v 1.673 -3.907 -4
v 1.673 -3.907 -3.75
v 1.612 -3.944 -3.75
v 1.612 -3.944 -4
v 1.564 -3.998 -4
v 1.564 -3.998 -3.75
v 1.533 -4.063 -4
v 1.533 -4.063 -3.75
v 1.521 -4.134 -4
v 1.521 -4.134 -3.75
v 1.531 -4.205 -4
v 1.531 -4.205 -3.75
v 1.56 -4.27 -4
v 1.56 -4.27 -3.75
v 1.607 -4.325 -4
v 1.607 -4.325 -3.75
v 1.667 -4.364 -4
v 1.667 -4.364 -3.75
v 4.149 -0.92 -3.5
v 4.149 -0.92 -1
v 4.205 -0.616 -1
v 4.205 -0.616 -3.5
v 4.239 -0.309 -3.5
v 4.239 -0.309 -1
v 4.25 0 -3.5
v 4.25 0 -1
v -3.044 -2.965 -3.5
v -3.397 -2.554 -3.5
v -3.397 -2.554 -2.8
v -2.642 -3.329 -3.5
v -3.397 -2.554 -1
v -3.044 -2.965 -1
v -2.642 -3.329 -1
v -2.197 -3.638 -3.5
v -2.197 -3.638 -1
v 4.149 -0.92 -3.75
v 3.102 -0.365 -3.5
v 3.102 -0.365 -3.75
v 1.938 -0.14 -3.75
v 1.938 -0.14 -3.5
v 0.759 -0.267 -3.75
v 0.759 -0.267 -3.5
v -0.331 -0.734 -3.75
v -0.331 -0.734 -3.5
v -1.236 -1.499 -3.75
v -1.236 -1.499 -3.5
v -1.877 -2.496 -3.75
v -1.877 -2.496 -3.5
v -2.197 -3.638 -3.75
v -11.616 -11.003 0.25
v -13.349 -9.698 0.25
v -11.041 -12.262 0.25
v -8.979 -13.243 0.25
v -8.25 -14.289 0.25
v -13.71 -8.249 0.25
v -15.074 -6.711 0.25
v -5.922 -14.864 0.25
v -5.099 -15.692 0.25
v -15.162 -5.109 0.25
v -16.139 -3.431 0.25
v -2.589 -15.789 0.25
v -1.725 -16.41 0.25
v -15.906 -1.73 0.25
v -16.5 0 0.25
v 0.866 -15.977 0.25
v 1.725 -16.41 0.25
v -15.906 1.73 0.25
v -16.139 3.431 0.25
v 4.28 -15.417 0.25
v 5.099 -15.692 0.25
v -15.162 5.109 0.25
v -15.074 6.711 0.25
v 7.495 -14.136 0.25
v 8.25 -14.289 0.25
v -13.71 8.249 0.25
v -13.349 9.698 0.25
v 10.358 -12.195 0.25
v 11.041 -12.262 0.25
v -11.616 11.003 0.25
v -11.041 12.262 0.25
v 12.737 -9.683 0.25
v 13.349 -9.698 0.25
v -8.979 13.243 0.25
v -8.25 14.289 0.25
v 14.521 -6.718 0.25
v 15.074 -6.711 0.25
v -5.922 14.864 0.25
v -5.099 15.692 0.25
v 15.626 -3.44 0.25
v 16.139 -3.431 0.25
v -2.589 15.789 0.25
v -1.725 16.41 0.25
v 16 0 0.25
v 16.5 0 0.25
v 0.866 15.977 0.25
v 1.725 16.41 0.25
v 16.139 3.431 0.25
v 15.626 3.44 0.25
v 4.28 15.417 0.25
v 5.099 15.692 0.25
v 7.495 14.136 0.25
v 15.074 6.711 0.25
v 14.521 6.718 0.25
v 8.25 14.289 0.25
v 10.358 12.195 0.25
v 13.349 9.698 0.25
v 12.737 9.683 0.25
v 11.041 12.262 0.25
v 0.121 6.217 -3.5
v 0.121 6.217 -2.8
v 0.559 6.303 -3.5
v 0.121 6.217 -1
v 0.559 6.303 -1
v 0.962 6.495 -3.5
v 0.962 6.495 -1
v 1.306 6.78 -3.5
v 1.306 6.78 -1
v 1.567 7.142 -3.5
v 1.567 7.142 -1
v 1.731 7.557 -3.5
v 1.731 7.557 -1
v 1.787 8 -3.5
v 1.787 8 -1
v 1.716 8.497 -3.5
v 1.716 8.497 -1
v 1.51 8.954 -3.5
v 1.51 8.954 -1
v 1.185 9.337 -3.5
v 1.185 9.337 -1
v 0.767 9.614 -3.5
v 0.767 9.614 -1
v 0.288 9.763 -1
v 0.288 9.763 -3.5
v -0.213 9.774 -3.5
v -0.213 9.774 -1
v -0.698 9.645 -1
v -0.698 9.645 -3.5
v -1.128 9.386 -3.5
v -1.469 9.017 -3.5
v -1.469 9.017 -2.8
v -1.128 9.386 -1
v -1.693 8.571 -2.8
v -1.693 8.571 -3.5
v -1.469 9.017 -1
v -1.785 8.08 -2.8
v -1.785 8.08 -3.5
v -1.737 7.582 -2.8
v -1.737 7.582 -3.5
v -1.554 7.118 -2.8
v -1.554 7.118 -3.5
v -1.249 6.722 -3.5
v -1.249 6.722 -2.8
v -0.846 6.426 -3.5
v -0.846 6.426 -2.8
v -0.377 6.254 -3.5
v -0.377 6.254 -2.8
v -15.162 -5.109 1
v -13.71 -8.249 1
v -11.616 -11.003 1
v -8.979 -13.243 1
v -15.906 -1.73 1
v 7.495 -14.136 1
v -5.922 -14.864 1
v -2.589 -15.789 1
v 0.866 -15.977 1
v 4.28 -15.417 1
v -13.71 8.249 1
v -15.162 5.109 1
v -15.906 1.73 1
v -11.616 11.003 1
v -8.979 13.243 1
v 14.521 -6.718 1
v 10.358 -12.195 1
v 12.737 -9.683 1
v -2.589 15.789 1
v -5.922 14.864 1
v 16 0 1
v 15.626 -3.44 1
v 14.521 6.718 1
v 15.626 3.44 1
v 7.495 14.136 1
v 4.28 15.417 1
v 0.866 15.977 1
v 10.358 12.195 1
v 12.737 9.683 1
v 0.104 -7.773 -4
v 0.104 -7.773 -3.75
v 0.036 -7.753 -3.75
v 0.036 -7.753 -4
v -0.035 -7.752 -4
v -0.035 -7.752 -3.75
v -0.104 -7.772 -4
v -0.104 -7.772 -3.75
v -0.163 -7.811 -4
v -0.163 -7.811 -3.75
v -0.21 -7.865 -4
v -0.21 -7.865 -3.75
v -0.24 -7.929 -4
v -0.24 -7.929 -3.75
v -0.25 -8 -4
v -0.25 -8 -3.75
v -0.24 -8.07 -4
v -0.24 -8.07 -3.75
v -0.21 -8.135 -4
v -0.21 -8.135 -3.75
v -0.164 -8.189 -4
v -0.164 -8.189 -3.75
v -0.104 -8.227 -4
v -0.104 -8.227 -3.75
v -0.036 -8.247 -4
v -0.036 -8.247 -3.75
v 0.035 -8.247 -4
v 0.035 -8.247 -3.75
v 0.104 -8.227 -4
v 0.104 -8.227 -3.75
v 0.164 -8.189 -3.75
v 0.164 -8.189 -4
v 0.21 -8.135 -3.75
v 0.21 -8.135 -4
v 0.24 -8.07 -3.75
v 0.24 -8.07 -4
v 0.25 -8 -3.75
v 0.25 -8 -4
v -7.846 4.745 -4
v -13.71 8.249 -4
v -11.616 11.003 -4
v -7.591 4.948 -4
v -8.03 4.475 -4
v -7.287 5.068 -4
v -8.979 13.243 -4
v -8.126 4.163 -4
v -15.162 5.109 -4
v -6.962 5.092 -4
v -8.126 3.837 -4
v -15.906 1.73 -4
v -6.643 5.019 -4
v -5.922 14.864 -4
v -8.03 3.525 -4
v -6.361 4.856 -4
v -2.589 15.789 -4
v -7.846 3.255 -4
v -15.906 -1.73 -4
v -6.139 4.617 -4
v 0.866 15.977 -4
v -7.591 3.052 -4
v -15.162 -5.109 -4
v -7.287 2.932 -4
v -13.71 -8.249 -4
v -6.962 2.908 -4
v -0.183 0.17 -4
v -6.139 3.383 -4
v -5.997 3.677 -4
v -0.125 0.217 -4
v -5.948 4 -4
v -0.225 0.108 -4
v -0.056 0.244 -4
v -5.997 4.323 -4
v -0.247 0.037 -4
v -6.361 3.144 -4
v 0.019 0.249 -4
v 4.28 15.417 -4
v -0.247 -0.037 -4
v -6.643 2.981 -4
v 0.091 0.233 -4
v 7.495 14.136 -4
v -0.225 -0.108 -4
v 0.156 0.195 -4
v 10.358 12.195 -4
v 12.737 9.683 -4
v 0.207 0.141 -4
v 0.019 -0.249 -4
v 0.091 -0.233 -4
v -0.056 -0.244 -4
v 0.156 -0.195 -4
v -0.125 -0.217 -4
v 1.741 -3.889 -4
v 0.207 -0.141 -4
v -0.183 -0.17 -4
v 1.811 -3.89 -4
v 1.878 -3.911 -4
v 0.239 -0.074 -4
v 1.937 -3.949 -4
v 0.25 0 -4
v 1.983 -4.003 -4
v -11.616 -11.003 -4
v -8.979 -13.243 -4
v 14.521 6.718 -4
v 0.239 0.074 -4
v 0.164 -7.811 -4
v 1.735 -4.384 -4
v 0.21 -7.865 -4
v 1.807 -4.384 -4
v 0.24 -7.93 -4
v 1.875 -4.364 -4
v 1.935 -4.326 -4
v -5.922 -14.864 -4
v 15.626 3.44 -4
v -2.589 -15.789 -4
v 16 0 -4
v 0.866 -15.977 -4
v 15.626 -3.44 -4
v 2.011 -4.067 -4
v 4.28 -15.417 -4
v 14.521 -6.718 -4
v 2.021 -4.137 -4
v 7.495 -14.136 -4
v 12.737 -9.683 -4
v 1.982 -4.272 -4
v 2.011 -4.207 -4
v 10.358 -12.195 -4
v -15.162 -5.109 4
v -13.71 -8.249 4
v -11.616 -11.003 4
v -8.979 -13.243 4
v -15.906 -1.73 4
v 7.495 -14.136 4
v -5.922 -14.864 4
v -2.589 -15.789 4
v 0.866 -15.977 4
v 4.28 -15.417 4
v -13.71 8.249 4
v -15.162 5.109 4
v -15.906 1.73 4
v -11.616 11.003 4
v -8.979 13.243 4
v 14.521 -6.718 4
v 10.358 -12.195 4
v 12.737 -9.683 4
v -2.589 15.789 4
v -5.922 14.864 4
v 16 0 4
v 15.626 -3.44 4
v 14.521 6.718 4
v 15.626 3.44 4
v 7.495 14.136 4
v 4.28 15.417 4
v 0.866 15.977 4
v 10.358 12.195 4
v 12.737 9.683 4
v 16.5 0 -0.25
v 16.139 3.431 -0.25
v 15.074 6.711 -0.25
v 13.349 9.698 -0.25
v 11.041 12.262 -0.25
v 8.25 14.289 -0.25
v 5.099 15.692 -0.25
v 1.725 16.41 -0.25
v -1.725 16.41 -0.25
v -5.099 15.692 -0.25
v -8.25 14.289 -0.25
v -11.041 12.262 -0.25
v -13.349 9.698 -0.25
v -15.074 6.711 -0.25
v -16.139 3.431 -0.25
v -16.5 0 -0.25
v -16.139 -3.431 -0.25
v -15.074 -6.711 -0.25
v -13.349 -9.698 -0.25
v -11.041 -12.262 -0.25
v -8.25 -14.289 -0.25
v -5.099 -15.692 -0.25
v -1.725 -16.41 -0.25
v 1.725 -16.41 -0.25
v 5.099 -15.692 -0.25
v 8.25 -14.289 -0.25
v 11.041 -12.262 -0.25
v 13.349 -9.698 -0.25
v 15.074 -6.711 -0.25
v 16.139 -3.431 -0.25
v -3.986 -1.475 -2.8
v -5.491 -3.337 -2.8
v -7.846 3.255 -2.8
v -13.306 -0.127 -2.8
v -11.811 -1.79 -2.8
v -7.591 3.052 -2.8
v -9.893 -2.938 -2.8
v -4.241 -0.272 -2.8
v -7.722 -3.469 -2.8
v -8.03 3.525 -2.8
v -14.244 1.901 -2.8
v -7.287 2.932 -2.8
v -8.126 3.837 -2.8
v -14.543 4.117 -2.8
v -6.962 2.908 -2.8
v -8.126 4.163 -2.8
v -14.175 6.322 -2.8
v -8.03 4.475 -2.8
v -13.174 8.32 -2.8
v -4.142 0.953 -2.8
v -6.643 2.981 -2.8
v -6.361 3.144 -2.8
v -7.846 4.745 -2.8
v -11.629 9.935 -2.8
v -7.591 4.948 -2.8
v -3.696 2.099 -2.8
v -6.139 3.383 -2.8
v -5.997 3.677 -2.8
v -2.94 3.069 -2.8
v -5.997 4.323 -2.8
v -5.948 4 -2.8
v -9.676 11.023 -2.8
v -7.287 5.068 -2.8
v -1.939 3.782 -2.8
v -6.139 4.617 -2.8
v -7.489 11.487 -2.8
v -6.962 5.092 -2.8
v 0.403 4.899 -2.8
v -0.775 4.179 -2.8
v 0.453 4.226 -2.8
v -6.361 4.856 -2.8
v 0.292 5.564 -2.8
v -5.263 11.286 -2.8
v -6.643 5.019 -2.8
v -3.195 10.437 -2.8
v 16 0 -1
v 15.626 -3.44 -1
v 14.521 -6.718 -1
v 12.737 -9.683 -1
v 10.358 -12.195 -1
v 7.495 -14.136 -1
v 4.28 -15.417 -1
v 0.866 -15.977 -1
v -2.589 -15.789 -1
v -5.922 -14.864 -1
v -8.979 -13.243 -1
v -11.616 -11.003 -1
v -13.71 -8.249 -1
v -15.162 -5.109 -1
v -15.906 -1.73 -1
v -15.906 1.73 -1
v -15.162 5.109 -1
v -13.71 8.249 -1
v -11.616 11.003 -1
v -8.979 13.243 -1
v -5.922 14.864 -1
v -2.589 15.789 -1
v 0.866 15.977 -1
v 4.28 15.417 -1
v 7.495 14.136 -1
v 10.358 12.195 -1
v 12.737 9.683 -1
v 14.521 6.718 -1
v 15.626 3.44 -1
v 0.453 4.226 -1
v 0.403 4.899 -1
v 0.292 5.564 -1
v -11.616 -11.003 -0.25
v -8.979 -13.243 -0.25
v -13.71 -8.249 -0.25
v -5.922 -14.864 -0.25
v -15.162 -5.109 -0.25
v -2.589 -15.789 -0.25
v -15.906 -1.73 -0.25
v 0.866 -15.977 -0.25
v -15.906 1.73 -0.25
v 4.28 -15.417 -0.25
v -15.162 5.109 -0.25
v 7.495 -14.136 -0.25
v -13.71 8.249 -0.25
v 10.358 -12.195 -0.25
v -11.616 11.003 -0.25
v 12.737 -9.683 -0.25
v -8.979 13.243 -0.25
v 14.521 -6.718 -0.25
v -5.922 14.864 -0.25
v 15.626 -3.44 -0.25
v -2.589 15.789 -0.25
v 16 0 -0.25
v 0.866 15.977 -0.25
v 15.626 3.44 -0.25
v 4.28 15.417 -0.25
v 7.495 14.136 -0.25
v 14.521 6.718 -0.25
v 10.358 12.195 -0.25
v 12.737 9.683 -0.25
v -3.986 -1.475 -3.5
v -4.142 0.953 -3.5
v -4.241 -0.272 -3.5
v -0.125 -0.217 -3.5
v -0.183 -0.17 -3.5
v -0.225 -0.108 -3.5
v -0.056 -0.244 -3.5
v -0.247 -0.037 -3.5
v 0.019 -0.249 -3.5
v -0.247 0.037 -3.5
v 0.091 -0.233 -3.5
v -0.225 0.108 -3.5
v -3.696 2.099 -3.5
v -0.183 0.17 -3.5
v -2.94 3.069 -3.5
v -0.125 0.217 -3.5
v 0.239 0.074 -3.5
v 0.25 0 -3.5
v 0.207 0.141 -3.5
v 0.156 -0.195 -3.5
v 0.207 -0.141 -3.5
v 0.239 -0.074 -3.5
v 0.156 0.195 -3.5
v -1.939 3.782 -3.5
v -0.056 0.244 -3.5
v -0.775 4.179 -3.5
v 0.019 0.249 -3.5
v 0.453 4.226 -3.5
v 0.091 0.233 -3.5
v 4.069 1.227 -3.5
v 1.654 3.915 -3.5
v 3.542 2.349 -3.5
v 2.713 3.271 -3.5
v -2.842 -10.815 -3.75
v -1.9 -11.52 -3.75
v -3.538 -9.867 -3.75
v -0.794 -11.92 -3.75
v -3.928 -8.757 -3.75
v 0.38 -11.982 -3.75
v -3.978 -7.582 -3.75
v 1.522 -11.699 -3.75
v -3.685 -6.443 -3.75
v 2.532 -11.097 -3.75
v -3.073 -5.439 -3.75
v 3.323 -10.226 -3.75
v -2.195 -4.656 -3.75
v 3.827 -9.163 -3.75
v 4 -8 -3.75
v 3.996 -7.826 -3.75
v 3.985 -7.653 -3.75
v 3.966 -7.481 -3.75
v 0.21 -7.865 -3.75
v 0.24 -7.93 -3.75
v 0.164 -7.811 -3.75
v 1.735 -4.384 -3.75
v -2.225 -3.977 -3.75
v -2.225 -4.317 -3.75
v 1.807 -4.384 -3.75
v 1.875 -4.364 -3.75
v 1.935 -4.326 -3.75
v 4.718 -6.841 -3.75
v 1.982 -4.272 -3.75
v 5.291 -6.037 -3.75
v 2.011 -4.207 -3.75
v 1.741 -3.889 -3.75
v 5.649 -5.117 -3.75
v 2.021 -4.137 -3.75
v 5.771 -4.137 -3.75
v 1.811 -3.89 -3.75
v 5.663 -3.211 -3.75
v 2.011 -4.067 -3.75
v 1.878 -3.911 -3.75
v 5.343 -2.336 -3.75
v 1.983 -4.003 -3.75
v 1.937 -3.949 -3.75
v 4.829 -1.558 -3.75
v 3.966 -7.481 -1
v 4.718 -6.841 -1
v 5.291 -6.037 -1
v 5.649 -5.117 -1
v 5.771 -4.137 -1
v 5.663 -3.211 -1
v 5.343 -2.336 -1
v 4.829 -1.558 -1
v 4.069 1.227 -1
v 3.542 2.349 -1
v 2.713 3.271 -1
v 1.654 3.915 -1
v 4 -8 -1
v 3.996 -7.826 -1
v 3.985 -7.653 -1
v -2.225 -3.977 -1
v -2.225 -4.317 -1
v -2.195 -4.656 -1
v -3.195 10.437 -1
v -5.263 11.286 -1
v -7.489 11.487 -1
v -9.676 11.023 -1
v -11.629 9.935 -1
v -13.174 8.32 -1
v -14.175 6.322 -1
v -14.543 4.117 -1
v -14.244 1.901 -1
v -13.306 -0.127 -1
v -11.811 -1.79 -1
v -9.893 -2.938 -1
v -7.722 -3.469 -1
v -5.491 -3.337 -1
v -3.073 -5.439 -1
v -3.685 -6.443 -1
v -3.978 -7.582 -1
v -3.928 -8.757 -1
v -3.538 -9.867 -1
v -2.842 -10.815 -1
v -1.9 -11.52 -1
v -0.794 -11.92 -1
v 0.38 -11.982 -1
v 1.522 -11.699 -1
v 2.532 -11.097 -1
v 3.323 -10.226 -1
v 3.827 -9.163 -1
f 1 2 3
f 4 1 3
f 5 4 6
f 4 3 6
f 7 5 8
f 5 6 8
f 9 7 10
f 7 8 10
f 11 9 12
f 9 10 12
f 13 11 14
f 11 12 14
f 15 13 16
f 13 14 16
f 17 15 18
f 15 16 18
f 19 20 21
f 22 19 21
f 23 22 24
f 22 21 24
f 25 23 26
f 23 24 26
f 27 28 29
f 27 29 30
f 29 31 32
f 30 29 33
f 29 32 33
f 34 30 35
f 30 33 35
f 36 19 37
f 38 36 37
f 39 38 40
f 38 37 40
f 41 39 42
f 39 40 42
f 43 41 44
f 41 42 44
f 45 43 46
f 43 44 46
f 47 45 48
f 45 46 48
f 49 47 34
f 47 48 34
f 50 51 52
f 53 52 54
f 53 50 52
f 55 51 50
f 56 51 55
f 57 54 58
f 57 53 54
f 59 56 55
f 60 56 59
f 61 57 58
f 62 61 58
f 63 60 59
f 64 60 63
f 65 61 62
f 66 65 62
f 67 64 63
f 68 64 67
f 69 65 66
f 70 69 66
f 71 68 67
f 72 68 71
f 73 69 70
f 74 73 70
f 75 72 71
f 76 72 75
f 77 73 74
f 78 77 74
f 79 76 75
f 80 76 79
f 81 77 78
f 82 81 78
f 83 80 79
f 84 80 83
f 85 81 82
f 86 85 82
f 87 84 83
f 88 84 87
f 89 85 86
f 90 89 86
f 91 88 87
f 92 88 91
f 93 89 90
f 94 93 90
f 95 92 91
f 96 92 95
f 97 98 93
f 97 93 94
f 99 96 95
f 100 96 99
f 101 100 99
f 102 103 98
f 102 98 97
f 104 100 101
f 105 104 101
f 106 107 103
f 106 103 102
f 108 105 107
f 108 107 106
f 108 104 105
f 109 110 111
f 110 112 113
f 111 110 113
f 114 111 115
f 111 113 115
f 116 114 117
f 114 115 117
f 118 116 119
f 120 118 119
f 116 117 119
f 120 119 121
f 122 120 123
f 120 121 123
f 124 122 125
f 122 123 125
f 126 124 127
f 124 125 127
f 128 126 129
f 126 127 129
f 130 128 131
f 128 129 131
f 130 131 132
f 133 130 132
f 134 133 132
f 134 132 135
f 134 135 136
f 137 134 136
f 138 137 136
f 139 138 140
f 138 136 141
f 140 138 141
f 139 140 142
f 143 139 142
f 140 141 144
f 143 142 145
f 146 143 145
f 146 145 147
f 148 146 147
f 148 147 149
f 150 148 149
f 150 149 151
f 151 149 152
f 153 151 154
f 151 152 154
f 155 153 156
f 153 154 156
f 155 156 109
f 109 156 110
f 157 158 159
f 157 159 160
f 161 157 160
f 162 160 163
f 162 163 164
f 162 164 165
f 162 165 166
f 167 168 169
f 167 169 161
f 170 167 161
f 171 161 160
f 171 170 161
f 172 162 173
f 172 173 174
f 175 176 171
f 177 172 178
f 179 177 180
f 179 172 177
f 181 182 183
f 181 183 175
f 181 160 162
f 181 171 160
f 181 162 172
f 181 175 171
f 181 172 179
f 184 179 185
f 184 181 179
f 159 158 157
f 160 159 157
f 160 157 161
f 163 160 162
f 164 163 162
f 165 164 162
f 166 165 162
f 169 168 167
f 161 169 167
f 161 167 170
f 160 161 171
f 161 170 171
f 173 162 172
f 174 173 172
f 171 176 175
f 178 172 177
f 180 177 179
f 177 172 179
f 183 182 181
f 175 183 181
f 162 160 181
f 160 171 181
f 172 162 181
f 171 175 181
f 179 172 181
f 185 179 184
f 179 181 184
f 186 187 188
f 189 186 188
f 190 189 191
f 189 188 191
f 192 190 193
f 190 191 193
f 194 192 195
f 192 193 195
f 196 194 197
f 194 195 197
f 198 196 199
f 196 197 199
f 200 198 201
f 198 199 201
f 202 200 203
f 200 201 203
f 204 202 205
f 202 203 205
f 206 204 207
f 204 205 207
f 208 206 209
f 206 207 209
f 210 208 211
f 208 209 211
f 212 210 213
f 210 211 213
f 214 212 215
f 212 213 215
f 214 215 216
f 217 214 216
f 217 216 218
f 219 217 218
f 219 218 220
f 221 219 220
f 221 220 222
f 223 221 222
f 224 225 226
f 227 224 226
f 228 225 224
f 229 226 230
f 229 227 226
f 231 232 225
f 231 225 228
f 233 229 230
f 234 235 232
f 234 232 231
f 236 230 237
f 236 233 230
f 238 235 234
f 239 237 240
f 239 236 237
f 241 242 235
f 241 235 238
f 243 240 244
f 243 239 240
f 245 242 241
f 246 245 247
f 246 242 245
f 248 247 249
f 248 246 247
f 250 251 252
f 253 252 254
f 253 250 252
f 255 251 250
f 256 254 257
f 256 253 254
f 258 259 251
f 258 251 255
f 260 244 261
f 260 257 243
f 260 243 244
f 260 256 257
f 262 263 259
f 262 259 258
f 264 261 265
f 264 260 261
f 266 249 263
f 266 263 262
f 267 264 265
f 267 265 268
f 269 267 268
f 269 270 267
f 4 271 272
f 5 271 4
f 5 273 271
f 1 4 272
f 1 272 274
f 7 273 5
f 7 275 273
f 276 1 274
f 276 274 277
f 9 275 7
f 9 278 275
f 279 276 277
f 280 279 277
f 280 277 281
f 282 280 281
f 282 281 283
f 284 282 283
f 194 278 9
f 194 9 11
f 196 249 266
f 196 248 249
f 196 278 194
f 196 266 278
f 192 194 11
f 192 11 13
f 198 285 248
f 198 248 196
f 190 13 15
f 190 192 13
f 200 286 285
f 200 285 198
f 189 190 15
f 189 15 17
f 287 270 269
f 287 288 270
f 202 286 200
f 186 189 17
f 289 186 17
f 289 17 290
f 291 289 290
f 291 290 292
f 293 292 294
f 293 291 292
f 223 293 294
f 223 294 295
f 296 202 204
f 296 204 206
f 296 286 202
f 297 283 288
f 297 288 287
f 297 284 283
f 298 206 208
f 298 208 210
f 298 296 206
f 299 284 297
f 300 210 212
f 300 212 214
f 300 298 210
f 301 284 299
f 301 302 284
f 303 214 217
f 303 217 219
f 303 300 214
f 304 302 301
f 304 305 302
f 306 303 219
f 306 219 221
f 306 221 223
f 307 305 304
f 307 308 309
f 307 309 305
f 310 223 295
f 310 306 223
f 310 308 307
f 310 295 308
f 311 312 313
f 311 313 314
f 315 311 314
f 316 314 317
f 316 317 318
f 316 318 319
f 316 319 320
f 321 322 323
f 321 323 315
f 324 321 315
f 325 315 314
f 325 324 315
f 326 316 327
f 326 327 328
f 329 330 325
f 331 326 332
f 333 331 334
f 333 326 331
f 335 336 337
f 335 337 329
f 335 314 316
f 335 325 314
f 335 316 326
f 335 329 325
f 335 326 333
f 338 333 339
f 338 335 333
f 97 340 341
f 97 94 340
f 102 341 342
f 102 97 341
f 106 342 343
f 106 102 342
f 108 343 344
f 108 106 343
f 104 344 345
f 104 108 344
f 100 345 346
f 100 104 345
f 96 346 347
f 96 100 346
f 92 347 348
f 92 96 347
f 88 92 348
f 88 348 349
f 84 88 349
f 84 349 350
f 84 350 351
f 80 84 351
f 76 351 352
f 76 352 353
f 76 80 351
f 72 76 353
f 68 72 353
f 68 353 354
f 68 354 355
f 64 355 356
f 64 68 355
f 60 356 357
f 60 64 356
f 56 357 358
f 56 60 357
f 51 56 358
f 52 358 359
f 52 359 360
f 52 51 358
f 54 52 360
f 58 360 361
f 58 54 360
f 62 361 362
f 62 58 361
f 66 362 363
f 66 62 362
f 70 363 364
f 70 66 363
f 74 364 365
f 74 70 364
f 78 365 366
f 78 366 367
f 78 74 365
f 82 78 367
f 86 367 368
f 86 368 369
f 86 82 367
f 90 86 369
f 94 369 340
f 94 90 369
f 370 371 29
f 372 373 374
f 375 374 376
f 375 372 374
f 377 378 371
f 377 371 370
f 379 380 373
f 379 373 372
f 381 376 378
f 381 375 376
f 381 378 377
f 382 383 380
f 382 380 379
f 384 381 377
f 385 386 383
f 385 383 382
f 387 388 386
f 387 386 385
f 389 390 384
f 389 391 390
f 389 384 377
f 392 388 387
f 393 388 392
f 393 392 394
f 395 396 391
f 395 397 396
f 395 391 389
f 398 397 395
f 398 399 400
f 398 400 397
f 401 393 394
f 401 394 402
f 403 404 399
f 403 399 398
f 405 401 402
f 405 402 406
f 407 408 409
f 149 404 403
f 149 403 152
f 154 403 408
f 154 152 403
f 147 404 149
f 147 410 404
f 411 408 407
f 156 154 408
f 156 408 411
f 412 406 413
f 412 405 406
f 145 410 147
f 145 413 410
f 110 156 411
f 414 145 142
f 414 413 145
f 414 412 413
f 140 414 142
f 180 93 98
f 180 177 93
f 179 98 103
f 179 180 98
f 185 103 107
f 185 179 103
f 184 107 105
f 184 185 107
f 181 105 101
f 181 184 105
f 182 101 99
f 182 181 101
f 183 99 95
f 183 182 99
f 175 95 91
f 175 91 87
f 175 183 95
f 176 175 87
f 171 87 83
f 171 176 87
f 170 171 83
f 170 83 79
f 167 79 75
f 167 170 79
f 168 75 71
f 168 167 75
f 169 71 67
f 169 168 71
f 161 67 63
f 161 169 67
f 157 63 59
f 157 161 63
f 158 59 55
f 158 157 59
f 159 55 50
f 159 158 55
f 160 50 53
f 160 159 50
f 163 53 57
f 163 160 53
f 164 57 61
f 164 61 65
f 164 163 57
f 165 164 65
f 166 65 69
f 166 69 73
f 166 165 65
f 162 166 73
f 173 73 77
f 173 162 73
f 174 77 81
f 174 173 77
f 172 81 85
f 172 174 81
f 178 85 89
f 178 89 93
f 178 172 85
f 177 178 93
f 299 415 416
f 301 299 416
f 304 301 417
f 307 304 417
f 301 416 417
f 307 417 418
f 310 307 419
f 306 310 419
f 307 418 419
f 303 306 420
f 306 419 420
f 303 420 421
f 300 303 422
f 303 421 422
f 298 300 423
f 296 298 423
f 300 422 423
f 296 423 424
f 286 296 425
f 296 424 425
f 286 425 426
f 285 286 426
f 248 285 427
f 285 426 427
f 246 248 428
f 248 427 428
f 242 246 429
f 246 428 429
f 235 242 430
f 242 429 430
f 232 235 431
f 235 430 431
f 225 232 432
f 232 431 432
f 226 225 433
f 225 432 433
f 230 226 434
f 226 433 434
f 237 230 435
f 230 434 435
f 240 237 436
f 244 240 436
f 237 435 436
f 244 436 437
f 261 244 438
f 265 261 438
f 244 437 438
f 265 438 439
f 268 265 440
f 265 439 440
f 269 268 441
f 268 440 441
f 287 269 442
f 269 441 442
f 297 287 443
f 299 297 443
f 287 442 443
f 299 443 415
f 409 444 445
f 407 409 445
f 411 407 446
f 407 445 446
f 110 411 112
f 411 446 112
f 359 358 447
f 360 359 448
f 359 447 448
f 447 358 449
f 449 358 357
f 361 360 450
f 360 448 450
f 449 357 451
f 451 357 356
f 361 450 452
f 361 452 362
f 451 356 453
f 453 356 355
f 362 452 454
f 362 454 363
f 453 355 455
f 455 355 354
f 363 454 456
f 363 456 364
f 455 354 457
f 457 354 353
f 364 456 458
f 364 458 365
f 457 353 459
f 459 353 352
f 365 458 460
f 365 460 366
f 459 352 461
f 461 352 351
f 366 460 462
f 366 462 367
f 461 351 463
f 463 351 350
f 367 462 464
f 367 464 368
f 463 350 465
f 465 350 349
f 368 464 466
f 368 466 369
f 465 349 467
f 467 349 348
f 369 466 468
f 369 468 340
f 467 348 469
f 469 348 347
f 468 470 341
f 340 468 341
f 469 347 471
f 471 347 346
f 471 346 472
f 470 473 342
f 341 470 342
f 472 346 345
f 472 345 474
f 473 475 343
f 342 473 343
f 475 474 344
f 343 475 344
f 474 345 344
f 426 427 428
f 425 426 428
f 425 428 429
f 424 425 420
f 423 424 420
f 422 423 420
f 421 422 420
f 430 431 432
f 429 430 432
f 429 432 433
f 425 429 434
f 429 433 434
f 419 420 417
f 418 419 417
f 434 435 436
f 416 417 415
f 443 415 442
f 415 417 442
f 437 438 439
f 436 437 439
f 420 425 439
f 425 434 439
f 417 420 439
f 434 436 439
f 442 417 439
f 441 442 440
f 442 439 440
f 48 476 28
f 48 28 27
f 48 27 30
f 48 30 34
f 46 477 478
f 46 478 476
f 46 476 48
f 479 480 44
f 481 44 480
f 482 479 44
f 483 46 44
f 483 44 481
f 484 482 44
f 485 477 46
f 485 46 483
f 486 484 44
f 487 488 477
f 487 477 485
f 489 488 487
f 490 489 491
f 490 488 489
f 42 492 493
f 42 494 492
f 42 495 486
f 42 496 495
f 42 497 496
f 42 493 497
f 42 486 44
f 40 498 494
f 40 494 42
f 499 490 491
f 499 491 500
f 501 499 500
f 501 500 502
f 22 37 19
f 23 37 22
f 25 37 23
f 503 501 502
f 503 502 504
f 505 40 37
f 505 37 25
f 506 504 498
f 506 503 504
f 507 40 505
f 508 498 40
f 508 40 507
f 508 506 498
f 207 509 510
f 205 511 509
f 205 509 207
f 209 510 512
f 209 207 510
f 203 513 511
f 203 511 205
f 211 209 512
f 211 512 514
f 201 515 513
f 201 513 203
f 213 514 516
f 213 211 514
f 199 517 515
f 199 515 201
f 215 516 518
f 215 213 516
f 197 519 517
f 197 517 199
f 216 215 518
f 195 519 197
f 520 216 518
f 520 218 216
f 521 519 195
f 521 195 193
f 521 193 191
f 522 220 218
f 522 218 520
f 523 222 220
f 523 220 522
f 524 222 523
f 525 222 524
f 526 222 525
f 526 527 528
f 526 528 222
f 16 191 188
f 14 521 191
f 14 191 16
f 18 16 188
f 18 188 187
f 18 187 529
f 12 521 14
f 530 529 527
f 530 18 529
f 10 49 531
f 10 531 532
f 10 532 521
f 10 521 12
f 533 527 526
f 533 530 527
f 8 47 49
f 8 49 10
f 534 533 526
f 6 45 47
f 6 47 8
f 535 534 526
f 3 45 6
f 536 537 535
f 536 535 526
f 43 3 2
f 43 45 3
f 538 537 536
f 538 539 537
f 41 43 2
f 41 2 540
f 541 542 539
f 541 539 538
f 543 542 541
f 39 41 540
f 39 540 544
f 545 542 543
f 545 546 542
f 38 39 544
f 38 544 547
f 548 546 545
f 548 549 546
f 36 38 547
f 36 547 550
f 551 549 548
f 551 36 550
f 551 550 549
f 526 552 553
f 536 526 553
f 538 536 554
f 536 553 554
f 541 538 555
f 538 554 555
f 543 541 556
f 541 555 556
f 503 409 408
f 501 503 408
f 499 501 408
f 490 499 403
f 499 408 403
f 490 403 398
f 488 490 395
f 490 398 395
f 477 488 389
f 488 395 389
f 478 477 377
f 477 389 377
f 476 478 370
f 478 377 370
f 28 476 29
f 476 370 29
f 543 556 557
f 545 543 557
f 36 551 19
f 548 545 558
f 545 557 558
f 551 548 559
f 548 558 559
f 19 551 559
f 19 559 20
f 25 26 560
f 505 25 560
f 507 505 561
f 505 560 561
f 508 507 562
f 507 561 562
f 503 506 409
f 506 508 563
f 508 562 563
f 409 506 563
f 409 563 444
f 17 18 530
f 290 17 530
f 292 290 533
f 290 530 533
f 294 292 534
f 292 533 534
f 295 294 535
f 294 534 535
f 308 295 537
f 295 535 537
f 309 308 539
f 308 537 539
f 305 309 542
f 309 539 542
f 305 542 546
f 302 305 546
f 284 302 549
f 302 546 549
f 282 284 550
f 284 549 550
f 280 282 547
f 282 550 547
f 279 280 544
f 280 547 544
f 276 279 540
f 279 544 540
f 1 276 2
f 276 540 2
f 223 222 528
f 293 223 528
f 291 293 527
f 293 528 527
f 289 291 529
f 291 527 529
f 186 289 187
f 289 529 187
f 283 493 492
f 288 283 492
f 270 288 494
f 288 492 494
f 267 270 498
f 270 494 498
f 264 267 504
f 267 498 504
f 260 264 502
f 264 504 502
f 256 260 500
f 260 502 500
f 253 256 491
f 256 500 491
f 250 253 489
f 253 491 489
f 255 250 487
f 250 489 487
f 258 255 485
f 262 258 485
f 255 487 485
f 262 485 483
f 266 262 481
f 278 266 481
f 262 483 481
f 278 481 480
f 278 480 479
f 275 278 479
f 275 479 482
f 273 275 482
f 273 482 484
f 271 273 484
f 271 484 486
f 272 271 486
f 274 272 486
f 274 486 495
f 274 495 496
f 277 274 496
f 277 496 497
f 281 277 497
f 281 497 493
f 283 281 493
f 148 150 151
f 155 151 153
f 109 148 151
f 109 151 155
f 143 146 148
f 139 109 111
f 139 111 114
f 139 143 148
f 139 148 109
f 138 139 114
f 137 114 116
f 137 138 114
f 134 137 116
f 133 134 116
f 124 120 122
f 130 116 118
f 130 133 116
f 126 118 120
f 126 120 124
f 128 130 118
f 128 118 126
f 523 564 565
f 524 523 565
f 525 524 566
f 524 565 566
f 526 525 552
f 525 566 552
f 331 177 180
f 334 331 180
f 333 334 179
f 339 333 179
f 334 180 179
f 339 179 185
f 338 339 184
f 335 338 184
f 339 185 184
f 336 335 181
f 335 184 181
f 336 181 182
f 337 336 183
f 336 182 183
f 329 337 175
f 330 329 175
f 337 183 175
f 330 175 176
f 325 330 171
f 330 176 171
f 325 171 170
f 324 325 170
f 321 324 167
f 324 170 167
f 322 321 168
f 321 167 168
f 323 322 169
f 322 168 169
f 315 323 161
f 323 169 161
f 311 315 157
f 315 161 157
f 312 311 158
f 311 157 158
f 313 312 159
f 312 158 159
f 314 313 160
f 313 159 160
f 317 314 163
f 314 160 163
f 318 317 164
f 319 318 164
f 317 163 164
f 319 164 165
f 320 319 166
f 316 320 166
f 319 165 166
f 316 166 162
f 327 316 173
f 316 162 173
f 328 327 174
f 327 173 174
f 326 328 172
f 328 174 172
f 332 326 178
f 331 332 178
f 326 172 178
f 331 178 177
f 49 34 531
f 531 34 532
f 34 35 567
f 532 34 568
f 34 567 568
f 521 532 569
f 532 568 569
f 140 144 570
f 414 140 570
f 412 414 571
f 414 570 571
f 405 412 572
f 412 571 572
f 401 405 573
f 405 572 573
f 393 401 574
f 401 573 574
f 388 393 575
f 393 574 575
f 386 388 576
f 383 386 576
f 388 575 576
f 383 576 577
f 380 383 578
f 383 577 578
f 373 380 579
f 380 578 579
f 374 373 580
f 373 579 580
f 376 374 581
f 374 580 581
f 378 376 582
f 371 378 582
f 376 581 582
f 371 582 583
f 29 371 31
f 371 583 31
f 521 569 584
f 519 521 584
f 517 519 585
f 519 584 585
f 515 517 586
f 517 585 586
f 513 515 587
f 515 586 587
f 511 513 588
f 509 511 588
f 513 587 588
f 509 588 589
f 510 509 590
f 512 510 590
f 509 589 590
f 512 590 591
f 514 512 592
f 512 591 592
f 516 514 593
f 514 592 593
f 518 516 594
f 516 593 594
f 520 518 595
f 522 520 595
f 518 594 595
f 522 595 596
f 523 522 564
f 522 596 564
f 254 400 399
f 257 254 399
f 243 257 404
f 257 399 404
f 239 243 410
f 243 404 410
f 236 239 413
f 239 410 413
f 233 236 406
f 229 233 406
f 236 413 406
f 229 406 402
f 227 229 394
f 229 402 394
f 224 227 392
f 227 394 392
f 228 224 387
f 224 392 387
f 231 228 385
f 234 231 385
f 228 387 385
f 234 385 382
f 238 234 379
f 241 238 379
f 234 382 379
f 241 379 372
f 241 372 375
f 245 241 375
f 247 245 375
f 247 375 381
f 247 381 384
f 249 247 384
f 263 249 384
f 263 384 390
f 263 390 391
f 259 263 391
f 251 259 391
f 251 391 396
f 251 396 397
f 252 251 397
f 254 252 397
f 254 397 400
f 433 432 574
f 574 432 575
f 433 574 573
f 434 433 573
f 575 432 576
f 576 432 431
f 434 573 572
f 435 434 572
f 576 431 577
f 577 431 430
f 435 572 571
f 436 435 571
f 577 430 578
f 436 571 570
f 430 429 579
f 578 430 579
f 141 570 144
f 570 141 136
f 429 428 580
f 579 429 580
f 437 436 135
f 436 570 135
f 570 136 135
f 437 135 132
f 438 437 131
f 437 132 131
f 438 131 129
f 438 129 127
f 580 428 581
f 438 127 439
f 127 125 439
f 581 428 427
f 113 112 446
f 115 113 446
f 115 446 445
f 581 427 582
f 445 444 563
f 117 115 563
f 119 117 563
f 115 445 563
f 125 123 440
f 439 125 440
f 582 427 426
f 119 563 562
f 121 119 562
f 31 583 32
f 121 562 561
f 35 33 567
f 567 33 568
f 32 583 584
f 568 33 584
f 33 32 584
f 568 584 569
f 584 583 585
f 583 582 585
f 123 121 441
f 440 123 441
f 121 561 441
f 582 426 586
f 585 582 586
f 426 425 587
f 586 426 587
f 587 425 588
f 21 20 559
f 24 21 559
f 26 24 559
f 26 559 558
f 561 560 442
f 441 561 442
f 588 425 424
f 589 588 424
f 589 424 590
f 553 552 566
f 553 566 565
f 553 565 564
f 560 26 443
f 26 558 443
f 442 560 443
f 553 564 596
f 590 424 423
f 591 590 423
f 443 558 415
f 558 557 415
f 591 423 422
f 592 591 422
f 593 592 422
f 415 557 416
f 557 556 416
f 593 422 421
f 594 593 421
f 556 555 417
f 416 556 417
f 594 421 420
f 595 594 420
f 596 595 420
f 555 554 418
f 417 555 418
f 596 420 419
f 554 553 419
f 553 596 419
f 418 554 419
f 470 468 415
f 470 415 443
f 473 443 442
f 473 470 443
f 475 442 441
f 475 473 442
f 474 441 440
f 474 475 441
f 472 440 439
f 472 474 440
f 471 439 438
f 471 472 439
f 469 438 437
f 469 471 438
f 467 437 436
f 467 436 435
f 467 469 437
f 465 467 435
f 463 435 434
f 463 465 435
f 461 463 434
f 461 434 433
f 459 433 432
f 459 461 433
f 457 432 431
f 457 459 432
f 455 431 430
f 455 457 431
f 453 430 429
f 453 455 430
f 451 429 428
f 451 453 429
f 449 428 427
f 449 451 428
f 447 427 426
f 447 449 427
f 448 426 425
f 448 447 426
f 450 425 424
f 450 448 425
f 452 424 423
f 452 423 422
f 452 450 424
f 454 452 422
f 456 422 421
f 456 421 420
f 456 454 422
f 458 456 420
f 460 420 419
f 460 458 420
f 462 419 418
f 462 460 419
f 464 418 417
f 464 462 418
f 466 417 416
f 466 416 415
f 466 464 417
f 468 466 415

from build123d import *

# Parameters (mm, degrees)
F0_R      = 16
F1_DEPTH  = 1
F0_R_2    = 16.5
F2_DEPTH  = 0.25
F3_R      = 16
F4_DEPTH  = 3
F5_R      = 16
F6_DEPTH  = 3
F8_DEPTH  = 3.001
F9_DEPTH  = 2.75
F7_R      = 0.25
F10_DEPTH = 3.001
F11_DEPTH = 2.5
F7_R_2    = 1.095
F12_DEPTH = 3.001
F13_DEPTH = 1.8
F14_DEPTH = 2.75
F15_DEPTH = 3.001
F16_DEPTH = 2.5


with BuildPart() as f1:
    # F0 (on Top) → F1 (new body, symmetric)
    with BuildSketch(Plane.XY):
        Circle(F0_R)
    extrude(amount=F1_DEPTH, both=True)

    # F0 (on Top) → F2 (join, symmetric)
    with BuildSketch(Plane.XY):
        Circle(F0_R_2)
        Circle(F0_R, mode=Mode.SUBTRACT)
    extrude(amount=F2_DEPTH, both=True)


with BuildPart() as f4:
    # F3 (on face) → F4 (new body)
    with BuildSketch(Plane.XY.offset(1)):
        Circle(F3_R)
    extrude(amount=F4_DEPTH)


with BuildPart() as f6:
    # F5 (on face) → F6 (new body)
    with BuildSketch(Plane(origin=(0, 0, -1), x_dir=(1, 0, 0), z_dir=(0, 0, -1))):
        Circle(F5_R)
    extrude(amount=F6_DEPTH)

    # F7 (on face) → F8 (cut, through all)
    with BuildSketch(Plane.XY.offset(-1)):
        with BuildLine():
            ThreePointArc((1.6671203117, -4.3639705905), (1.906317634, -4.3471335232), (2.0213153258, -4.13671875))
            ThreePointArc((2.0213153258, -4.13671875), (1.9089714055, -3.9280304568), (1.6729088959, -3.9069010515))
            ThreePointArc((1.6729088959, -3.9069010515), (1.5213353723, -4.133552864), (1.6671203117, -4.3639705905))
        make_face()
    extrude(amount=-F8_DEPTH, mode=Mode.SUBTRACT)

    # F7 (on face) → F9 (cut)
    with BuildSketch(Plane.XY.offset(-1)):
        with BuildLine():
            ThreePointArc((1.6671203117, -4.3639705905), (1.5213353723, -4.133552864), (1.6729088959, -3.9069010515))
            ThreePointArc((1.6729088959, -3.9069010515), (1.3446888601, -4.0316636603), (1.0072900172, -4.12890625))
            ThreePointArc((1.0072900172, -4.12890625), (1.3423604072, -4.2319675509), (1.6671203117, -4.3639705905))
        make_face()
        with BuildLine():
            ThreePointArc((1.6729088959, -3.9069010515), (1.9089714055, -3.9280304568), (2.0213153258, -4.13671875))
            ThreePointArc((2.0213153258, -4.13671875), (1.906317634, -4.3471335232), (1.6671203117, -4.3639705905))
            ThreePointArc((1.6671203117, -4.3639705905), (3.2190154397, -5.6255654149), (3.96615671, -7.4807688839))
            ThreePointArc((3.96615671, -7.4807688839), (5.2912134448, -6.0368022302), (5.7713153258, -4.13671875))
            ThreePointArc((5.7713153258, -4.13671875), (5.3428308655, -2.3355311557), (4.1491769509, -0.9202340085))
            ThreePointArc((4.1491769509, -0.9202340085), (3.2717298037, -2.7126157287), (1.6729088959, -3.9069010515))
        make_face()
        with BuildLine():
            ThreePointArc((1.0072900172, -4.12890625), (1.3446888601, -4.0316636603), (1.6729088959, -3.9069010515))
            ThreePointArc((1.6729088959, -3.9069010515), (3.2717298037, -2.7126157287), (4.1491769509, -0.9202340085))
            ThreePointArc((4.1491769509, -0.9202340085), (0.196812814, -0.4596354167), (-2.1974498789, -3.6378172067))
            ThreePointArc((-2.1974498789, -3.6378172067), (-1.6210742002, -3.9286916954), (-1.0072900172, -4.12890625))
            ThreePointArc((-1.0072900172, -4.12890625), (0, -4), (1.0072900172, -4.12890625))
        make_face()
        with BuildLine():
            ThreePointArc((3.96615671, -7.4807688839), (3.2190154397, -5.6255654149), (1.6671203117, -4.3639705905))
            ThreePointArc((1.6671203117, -4.3639705905), (1.3423604072, -4.2319675509), (1.0072900172, -4.12890625))
            ThreePointArc((1.0072900172, -4.12890625), (0, -4.25), (-1.0072900172, -4.12890625))
            ThreePointArc((-1.0072900172, -4.12890625), (-1.6226075068, -4.3438893782), (-2.1948413842, -4.6559498661))
            ThreePointArc((-2.1948413842, -4.6559498661), (-1.4477001127, -6.5111533367), (0.1041950177, -7.7727481611))
            ThreePointArc((0.1041950177, -7.7727481611), (2.0728702265, -8.1253356333), (3.96615671, -7.4807688839))
        make_face()
        with BuildLine():
            ThreePointArc((-2.1948413842, -4.6559498661), (-1.6226075068, -4.3438893782), (-1.0072900172, -4.12890625))
            ThreePointArc((-1.0072900172, -4.12890625), (-1.6210742002, -3.9286916954), (-2.1974498789, -3.6378172067))
            ThreePointArc((-2.1974498789, -3.6378172067), (-2.2286715462, -4.146966869), (-2.1948413842, -4.6559498661))
        make_face()
        with BuildLine():
            ThreePointArc((-1.0072900172, -4.12890625), (0, -4.25), (1.0072900172, -4.12890625))
            ThreePointArc((1.0072900172, -4.12890625), (0, -4), (-1.0072900172, -4.12890625))
        make_face()
    extrude(amount=-F9_DEPTH, mode=Mode.SUBTRACT)

    # F7 (on face) → F10 (cut, through all)
    with BuildSketch(Plane.XY.offset(-1)):
        Circle(F7_R)
    extrude(amount=-F10_DEPTH, mode=Mode.SUBTRACT)

    # F7 (on face) → F11 (cut)
    with BuildSketch(Plane.XY.offset(-1)):
        with BuildLine():
            ThreePointArc((-2.1974498789, -3.6378172067), (0.196812814, -0.4596354167), (4.1491769509, -0.9202340085))
            ThreePointArc((4.1491769509, -0.9202340085), (4.2247190463, -0.46287037), (4.25, 0))
            ThreePointArc((4.25, 0), (3.1613643157, 2.8404710284), (0.4531643937, 4.225771176))
            ThreePointArc((0.4531643937, 4.225771176), (0.4557135544, 4.1128983799), (0.4565633388, 4))
            ThreePointArc((0.4565633388, 4), (-0.578227274, 0.1985440185), (-3.3970546824, -2.5539223725))
            ThreePointArc((-3.3970546824, -2.5539223725), (-2.8492678576, -3.1534382308), (-2.1974498789, -3.6378172067))
        make_face()
        Circle(F7_R, mode=Mode.SUBTRACT)
        with BuildLine():
            ThreePointArc((0.4531643937, 4.225771176), (-3.6956303469, 2.0987654321), (-3.3970546824, -2.5539223725))
            ThreePointArc((-3.3970546824, -2.5539223725), (-0.578227274, 0.1985440185), (0.4565633388, 4))
            ThreePointArc((0.4565633388, 4), (0.4557135544, 4.1128983799), (0.4531643937, 4.225771176))
        make_face()
    extrude(amount=-F11_DEPTH, mode=Mode.SUBTRACT)

    # F7 (on face) → F12 (cut, through all)
    with BuildSketch(Plane.XY.offset(-1)):
        with Locations((-7.0434366612, 4)):
            Circle(F7_R_2)
    extrude(amount=-F12_DEPTH, mode=Mode.SUBTRACT)

    # F7 (on face) → F13 (cut)
    with BuildSketch(Plane.XY.offset(-1)):
        with BuildLine():
            ThreePointArc((-1.4687815286, 9.0172921136), (-14.4414183132, 5.2328290543), (-3.3970546824, -2.5539223725))
            ThreePointArc((-3.3970546824, -2.5539223725), (-3.6956303469, 2.0987654321), (0.4531643937, 4.225771176))
            ThreePointArc((0.4531643937, 4.225771176), (0.3545449908, 5.2328290543), (0.1212637306, 6.2174463456))
            ThreePointArc((0.1212637306, 6.2174463456), (-1.5536200099, 7.1176920673), (-1.4687815286, 9.0172921136))
        make_face()
        with Locations((-7.0434366612, 4)):
            Circle(F7_R_2, mode=Mode.SUBTRACT)
        with BuildLine():
            ThreePointArc((1.7866735637, 8), (0.5329020994, 9.7053497517), (-1.4687815286, 9.0172921136))
            ThreePointArc((-1.4687815286, 9.0172921136), (-0.521736049, 7.7037037037), (0.1212637306, 6.2174463456))
            ThreePointArc((0.1212637306, 6.2174463456), (1.3055384186, 6.7802574613), (1.7866735637, 8))
        make_face()
    extrude(amount=-F13_DEPTH, mode=Mode.SUBTRACT)

    # F7 (on face) → F14 (cut, through all)
    with BuildSketch(Plane.XY.offset(-1)):
        with BuildLine():
            ThreePointArc((4, -8), (3.9915302103, -7.7398335532), (3.96615671, -7.4807688839))
            ThreePointArc((3.96615671, -7.4807688839), (2.0728702265, -8.1253356333), (0.1041950177, -7.7727481611))
            ThreePointArc((0.1041950177, -7.7727481611), (-1.4477001127, -6.5111533367), (-2.1948413842, -4.6559498661))
            ThreePointArc((-2.1948413842, -4.6559498661), (-1.9000834802, -11.519898119), (4, -8))
        make_face()
        with BuildLine():
            ThreePointArc((0.25, -8), (-0.2104147742, -8.1350023066), (0.1041950177, -7.7727481611))
            ThreePointArc((0.1041950177, -7.7727481611), (0.2104147742, -7.8649976934), (0.25, -8))
        make_face(mode=Mode.SUBTRACT)
        with BuildLine():
            ThreePointArc((3.96615671, -7.4807688839), (3.2190154397, -5.6255654149), (1.6671203117, -4.3639705905))
            ThreePointArc((1.6671203117, -4.3639705905), (1.3423604072, -4.2319675509), (1.0072900172, -4.12890625))
            ThreePointArc((1.0072900172, -4.12890625), (0, -4.25), (-1.0072900172, -4.12890625))
            ThreePointArc((-1.0072900172, -4.12890625), (-1.6226075068, -4.3438893782), (-2.1948413842, -4.6559498661))
            ThreePointArc((-2.1948413842, -4.6559498661), (-1.4477001127, -6.5111533367), (0.1041950177, -7.7727481611))
            ThreePointArc((0.1041950177, -7.7727481611), (2.0728702265, -8.1253356333), (3.96615671, -7.4807688839))
        make_face()
        with BuildLine():
            ThreePointArc((-1.0072900172, -4.12890625), (0, -4.25), (1.0072900172, -4.12890625))
            ThreePointArc((1.0072900172, -4.12890625), (0, -4), (-1.0072900172, -4.12890625))
        make_face()
    extrude(amount=-F14_DEPTH, mode=Mode.SUBTRACT)

    # F7 (on face) → F15 (cut, through all)
    with BuildSketch(Plane.XY.offset(-1)):
        with BuildLine():
            ThreePointArc((0.25, -8), (0.2104147742, -7.8649976934), (0.1041950177, -7.7727481611))
            ThreePointArc((0.1041950177, -7.7727481611), (-0.2104147742, -8.1350023066), (0.25, -8))
        make_face()
    extrude(amount=-F15_DEPTH, mode=Mode.SUBTRACT)

    # F7 (on face) → F16 (cut, through all)
    with BuildSketch(Plane.XY.offset(-1)):
        with BuildLine():
            ThreePointArc((0.1212637306, 6.2174463456), (-0.521736049, 7.7037037037), (-1.4687815286, 9.0172921136))
            ThreePointArc((-1.4687815286, 9.0172921136), (-1.5536200099, 7.1176920673), (0.1212637306, 6.2174463456))
        make_face()
        with BuildLine():
            ThreePointArc((1.7866735637, 8), (0.5329020994, 9.7053497517), (-1.4687815286, 9.0172921136))
            ThreePointArc((-1.4687815286, 9.0172921136), (-0.521736049, 7.7037037037), (0.1212637306, 6.2174463456))
            ThreePointArc((0.1212637306, 6.2174463456), (1.3055384186, 6.7802574613), (1.7866735637, 8))
        make_face()
    extrude(amount=-F16_DEPTH, mode=Mode.SUBTRACT)


solid = Compound([f1.part, f4.part, f6.part])
